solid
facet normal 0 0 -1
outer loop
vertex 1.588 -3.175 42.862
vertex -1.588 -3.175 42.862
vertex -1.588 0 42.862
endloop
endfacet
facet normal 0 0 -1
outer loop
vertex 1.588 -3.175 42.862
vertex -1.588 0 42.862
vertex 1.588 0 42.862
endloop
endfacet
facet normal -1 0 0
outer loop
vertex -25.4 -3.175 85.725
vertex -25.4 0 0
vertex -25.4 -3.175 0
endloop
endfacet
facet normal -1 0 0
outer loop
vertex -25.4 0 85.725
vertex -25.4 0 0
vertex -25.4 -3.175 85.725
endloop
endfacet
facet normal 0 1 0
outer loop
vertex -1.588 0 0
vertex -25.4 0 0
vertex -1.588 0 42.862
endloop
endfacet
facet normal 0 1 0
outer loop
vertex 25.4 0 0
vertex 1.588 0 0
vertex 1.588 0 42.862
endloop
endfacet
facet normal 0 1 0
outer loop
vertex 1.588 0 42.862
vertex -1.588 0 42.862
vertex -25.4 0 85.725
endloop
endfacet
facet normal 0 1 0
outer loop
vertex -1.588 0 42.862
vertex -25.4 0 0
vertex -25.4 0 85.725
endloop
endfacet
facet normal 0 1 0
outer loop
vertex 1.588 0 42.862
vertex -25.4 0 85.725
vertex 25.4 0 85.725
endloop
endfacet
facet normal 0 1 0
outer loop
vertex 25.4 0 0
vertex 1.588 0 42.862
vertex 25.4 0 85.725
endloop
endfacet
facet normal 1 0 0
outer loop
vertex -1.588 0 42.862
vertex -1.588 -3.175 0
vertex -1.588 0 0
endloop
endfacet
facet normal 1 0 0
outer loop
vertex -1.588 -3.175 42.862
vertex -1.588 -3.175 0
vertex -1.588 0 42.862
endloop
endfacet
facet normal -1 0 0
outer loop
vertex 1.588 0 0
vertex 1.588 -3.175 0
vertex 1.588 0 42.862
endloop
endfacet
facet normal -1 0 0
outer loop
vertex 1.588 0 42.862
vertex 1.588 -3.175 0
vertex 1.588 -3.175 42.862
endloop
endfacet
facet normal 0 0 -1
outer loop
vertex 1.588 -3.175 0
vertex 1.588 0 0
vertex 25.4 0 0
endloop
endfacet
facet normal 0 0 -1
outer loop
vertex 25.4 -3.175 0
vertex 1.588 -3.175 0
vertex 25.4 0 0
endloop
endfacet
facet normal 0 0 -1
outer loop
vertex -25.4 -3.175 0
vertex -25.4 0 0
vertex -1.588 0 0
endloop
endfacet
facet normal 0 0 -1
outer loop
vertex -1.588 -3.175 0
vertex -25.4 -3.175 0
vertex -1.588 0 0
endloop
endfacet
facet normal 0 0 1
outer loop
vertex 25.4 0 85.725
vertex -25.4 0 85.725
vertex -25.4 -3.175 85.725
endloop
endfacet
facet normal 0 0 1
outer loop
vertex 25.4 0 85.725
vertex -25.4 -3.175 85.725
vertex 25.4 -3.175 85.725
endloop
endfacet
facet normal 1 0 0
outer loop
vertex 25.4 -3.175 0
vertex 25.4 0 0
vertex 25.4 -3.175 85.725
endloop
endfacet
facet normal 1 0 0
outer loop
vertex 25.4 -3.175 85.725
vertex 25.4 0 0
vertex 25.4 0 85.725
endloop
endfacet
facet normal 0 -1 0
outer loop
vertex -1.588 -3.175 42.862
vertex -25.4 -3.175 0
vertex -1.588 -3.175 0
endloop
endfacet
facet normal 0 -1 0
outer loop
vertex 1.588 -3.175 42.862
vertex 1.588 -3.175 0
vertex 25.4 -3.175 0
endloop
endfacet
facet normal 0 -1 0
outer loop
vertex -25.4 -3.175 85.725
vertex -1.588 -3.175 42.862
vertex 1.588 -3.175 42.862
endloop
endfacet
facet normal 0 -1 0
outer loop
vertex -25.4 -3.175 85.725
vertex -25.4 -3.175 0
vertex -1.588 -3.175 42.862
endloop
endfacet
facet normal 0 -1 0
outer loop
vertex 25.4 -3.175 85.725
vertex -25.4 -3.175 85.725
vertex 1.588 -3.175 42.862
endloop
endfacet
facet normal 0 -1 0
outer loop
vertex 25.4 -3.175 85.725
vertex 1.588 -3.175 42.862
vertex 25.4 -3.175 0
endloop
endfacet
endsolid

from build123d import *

# Parameters (mm, degrees)
F0_W     = 50.8
F0_H     = 85.725
F1_DEPTH = 3.175
F2_W     = 3.175
F2_H     = 42.8625
F3_DEPTH = 3.175


with BuildPart() as f1:
    # F0 (on Front) → F1 (new body)
    with BuildSketch(Plane.XZ):
        with Locations((0, 42.8625)):
            Rectangle(F0_W, F0_H)
    extrude(amount=F1_DEPTH)

    # F2 (on face) → F3 (cut)
    with BuildSketch(Plane.XZ.offset(3.175)):
        with Locations((0, 21.43125)):
            Rectangle(F2_W, F2_H)
    extrude(amount=-F3_DEPTH, mode=Mode.SUBTRACT)


with BuildPart() as f4_1:
    # F4: copy of F1
    add(f1.part)


solid = f1.part
